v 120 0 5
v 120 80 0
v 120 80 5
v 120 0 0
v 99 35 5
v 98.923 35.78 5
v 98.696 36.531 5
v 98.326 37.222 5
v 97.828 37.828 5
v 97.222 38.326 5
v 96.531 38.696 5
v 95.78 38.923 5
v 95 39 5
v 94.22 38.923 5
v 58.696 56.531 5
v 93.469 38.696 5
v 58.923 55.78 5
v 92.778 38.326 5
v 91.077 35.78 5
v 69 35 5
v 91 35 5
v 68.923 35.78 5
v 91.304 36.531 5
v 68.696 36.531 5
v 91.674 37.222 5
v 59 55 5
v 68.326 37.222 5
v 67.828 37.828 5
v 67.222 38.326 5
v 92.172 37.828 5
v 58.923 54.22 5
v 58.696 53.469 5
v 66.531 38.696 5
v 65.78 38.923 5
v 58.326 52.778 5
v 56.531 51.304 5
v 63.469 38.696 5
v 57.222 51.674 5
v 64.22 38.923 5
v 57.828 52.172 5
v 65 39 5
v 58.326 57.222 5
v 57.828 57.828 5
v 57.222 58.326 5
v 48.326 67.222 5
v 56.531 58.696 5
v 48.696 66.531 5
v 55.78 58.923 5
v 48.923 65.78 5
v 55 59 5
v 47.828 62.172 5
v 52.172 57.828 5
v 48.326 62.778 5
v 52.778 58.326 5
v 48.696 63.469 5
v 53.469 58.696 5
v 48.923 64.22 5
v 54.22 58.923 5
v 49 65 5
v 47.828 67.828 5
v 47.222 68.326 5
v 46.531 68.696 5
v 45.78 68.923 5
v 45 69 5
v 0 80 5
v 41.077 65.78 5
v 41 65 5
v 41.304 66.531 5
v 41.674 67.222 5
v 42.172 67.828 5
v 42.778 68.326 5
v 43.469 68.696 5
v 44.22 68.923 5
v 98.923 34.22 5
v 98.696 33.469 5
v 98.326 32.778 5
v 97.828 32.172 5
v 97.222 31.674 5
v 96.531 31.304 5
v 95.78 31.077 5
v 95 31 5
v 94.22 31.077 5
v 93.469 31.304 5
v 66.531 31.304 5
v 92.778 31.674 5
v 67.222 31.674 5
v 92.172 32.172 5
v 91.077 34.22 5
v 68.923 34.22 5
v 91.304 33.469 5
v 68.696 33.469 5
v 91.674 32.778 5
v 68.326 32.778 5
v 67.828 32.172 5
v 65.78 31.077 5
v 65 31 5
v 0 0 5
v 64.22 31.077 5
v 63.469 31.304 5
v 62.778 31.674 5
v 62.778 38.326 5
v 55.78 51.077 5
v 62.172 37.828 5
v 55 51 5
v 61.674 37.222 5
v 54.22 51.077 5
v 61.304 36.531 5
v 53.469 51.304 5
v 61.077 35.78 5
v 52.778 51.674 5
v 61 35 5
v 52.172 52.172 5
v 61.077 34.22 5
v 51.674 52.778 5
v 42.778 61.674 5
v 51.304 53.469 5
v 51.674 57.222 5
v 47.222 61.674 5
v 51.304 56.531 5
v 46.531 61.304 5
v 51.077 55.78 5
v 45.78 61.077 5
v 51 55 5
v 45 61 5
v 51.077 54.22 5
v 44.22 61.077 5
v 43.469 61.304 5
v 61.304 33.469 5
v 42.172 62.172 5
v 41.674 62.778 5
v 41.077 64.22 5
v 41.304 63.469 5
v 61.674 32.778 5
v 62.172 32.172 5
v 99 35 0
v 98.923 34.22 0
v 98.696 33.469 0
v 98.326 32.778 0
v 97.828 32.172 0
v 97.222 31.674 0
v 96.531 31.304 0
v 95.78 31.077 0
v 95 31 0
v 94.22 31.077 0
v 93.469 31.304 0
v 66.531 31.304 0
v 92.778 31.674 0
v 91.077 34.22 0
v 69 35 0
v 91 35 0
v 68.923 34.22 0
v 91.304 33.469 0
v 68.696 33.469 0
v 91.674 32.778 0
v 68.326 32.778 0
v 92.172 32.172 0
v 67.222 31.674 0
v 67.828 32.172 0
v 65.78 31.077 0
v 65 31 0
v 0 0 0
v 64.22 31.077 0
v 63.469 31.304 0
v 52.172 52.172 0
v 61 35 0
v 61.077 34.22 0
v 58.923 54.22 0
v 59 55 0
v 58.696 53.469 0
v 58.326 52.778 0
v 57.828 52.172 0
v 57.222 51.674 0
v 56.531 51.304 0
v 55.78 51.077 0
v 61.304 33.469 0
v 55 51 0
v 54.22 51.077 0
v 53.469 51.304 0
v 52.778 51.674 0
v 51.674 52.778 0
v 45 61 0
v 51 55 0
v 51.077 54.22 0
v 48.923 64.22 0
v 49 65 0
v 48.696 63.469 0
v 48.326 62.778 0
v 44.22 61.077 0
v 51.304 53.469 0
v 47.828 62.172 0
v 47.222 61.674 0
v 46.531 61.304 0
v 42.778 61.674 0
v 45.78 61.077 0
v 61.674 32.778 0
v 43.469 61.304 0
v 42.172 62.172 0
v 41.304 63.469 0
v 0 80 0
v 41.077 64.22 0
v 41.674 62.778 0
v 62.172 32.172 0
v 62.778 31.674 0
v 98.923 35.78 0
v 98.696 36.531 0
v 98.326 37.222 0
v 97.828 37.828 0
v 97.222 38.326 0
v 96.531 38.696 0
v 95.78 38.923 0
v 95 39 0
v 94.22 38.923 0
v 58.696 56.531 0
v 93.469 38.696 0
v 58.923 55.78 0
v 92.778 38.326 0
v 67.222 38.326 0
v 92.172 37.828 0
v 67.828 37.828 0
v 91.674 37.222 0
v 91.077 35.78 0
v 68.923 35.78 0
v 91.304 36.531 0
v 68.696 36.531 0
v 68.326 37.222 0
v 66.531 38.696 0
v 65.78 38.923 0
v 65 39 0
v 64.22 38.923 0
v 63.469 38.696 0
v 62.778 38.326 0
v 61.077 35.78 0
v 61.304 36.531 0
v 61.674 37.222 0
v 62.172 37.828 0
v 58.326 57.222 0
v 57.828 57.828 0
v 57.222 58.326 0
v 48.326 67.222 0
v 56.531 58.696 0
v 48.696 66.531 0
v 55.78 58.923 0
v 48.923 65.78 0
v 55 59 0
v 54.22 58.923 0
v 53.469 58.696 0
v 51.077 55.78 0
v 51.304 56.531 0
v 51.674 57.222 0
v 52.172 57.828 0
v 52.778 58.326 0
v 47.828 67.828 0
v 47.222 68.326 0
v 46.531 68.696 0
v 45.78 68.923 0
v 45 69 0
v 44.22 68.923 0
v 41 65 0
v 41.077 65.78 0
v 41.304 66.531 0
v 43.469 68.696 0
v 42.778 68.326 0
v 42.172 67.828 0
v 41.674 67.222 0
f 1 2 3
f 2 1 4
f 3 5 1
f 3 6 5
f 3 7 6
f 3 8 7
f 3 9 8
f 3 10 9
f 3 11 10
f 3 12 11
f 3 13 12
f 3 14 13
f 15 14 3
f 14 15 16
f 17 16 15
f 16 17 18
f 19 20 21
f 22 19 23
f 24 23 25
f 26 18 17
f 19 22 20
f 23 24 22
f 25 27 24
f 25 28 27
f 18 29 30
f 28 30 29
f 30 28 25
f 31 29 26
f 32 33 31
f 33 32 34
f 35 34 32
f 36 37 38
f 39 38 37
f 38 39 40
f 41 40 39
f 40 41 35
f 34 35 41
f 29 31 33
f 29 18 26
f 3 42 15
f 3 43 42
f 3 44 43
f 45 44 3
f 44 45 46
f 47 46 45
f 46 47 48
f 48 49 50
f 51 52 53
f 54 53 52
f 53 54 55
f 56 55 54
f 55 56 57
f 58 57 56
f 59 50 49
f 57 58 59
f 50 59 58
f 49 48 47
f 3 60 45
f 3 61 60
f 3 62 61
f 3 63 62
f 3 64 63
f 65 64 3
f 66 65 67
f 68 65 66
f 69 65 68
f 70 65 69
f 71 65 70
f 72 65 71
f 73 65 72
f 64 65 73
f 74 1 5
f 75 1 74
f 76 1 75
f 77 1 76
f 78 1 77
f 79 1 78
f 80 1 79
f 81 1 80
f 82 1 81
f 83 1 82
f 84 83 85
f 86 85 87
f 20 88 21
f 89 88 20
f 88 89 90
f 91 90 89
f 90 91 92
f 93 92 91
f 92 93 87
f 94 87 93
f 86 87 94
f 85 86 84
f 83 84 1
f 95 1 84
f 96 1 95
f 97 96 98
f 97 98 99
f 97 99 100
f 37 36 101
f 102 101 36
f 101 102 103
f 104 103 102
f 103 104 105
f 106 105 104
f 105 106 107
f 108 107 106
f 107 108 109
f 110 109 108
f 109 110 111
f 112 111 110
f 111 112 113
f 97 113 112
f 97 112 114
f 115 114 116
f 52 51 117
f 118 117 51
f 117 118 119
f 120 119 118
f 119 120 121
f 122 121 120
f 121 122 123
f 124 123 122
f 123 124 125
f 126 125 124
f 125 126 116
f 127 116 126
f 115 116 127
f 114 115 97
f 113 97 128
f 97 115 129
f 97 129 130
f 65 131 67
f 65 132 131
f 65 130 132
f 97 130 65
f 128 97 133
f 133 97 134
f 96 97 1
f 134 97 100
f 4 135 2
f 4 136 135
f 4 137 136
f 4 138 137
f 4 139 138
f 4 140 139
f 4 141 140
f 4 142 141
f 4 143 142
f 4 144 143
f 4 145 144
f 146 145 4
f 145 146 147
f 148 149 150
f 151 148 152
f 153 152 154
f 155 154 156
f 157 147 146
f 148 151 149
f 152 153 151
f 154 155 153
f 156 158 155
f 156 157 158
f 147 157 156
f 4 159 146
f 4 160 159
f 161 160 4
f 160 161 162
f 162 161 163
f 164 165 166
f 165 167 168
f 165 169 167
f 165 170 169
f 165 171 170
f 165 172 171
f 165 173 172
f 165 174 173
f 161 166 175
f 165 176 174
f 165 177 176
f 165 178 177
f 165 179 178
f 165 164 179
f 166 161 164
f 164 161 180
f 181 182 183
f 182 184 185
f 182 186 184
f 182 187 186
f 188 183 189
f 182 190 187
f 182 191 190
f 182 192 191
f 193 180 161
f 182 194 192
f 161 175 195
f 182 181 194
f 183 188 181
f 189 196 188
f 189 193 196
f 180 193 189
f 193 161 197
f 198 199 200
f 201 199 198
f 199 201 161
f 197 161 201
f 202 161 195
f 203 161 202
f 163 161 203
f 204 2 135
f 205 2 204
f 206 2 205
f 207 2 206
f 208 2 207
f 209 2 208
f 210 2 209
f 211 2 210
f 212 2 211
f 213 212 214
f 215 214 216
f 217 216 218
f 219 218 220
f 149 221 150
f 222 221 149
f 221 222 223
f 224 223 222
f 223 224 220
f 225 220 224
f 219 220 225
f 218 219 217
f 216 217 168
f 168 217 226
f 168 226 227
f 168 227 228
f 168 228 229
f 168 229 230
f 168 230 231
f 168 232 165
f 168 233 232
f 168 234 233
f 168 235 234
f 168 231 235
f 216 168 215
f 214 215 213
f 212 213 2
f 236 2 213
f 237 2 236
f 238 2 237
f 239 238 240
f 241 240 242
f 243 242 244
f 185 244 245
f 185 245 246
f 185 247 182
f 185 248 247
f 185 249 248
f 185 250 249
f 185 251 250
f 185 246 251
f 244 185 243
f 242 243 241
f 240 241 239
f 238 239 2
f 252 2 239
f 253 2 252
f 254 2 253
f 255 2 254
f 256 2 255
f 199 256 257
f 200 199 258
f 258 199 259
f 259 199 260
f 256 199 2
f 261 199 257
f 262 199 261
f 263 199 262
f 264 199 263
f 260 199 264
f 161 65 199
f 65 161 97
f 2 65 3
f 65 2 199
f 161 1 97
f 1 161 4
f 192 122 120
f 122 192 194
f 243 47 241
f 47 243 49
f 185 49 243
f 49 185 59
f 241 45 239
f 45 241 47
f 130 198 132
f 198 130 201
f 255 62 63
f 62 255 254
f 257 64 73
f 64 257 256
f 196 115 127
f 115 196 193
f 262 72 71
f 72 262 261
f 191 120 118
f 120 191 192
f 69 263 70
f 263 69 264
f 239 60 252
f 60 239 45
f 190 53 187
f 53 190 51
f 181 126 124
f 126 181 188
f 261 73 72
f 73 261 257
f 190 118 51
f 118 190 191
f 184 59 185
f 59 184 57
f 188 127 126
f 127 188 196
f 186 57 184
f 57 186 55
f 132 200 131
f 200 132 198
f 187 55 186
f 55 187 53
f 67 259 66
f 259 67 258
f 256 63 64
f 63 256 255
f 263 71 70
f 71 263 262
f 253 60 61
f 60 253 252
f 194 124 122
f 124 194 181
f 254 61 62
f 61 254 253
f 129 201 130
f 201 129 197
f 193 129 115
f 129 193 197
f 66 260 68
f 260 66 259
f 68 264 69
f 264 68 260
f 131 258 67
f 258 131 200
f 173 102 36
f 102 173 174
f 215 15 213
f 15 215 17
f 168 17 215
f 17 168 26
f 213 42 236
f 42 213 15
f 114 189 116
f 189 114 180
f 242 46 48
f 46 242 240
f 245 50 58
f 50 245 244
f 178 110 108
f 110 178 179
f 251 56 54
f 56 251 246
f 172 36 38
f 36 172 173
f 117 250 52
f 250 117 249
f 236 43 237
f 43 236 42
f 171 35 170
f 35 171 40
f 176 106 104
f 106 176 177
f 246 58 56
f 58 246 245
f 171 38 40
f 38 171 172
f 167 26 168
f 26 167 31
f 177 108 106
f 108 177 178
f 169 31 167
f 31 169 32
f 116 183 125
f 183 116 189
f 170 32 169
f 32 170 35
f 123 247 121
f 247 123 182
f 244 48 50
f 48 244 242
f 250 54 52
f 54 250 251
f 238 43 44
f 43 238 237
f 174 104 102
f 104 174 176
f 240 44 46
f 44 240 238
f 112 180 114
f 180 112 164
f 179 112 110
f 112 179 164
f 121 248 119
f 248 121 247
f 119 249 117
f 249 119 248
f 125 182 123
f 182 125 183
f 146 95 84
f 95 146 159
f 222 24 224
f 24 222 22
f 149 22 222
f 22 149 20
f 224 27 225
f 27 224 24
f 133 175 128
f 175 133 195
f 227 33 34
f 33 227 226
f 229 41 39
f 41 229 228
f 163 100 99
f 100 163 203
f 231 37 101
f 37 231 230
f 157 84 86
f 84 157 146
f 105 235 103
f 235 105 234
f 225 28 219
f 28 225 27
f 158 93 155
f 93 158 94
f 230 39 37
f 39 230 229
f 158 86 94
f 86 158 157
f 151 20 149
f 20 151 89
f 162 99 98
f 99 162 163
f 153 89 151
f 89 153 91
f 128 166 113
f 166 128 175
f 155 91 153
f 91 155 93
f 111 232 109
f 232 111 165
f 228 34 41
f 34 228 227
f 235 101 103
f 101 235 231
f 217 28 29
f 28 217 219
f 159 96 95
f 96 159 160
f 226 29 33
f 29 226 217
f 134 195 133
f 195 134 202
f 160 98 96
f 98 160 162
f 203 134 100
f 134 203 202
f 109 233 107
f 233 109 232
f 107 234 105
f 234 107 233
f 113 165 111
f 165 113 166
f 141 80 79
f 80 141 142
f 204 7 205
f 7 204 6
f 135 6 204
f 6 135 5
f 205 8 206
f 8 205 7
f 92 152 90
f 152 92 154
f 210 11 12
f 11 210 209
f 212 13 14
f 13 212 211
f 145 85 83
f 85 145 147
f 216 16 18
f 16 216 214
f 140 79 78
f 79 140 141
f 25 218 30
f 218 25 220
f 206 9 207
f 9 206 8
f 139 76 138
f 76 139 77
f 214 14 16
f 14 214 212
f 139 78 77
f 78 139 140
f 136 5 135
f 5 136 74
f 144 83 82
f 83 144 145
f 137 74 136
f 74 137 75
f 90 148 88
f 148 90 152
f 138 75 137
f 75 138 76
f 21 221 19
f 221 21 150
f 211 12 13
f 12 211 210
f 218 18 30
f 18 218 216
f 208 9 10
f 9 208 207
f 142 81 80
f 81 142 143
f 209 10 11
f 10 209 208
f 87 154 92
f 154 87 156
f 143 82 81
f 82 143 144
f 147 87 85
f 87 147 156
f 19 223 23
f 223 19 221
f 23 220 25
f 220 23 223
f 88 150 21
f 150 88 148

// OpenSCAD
$fn = 32;

// ----------------------------------------------------------------------
// Hole field: plate with holes at given coordinates
// ----------------------------------------------------------------------

// --- parameters (mm) ---
plate_l = 120;            // plate length, X
plate_w = 80;             // plate width, Y
plate_t = 5;              // plate thickness, Z
hole_d = 8;               // hole diameter

difference() {
  cube([plate_l, plate_w, plate_t]);
  translate([45, 65, -1]) cylinder(h = plate_t + 2, d = hole_d);
  translate([55, 55, -1]) cylinder(h = plate_t + 2, d = hole_d);
  translate([65, 35, -1]) cylinder(h = plate_t + 2, d = hole_d);
  translate([95, 35, -1]) cylinder(h = plate_t + 2, d = hole_d);
}
